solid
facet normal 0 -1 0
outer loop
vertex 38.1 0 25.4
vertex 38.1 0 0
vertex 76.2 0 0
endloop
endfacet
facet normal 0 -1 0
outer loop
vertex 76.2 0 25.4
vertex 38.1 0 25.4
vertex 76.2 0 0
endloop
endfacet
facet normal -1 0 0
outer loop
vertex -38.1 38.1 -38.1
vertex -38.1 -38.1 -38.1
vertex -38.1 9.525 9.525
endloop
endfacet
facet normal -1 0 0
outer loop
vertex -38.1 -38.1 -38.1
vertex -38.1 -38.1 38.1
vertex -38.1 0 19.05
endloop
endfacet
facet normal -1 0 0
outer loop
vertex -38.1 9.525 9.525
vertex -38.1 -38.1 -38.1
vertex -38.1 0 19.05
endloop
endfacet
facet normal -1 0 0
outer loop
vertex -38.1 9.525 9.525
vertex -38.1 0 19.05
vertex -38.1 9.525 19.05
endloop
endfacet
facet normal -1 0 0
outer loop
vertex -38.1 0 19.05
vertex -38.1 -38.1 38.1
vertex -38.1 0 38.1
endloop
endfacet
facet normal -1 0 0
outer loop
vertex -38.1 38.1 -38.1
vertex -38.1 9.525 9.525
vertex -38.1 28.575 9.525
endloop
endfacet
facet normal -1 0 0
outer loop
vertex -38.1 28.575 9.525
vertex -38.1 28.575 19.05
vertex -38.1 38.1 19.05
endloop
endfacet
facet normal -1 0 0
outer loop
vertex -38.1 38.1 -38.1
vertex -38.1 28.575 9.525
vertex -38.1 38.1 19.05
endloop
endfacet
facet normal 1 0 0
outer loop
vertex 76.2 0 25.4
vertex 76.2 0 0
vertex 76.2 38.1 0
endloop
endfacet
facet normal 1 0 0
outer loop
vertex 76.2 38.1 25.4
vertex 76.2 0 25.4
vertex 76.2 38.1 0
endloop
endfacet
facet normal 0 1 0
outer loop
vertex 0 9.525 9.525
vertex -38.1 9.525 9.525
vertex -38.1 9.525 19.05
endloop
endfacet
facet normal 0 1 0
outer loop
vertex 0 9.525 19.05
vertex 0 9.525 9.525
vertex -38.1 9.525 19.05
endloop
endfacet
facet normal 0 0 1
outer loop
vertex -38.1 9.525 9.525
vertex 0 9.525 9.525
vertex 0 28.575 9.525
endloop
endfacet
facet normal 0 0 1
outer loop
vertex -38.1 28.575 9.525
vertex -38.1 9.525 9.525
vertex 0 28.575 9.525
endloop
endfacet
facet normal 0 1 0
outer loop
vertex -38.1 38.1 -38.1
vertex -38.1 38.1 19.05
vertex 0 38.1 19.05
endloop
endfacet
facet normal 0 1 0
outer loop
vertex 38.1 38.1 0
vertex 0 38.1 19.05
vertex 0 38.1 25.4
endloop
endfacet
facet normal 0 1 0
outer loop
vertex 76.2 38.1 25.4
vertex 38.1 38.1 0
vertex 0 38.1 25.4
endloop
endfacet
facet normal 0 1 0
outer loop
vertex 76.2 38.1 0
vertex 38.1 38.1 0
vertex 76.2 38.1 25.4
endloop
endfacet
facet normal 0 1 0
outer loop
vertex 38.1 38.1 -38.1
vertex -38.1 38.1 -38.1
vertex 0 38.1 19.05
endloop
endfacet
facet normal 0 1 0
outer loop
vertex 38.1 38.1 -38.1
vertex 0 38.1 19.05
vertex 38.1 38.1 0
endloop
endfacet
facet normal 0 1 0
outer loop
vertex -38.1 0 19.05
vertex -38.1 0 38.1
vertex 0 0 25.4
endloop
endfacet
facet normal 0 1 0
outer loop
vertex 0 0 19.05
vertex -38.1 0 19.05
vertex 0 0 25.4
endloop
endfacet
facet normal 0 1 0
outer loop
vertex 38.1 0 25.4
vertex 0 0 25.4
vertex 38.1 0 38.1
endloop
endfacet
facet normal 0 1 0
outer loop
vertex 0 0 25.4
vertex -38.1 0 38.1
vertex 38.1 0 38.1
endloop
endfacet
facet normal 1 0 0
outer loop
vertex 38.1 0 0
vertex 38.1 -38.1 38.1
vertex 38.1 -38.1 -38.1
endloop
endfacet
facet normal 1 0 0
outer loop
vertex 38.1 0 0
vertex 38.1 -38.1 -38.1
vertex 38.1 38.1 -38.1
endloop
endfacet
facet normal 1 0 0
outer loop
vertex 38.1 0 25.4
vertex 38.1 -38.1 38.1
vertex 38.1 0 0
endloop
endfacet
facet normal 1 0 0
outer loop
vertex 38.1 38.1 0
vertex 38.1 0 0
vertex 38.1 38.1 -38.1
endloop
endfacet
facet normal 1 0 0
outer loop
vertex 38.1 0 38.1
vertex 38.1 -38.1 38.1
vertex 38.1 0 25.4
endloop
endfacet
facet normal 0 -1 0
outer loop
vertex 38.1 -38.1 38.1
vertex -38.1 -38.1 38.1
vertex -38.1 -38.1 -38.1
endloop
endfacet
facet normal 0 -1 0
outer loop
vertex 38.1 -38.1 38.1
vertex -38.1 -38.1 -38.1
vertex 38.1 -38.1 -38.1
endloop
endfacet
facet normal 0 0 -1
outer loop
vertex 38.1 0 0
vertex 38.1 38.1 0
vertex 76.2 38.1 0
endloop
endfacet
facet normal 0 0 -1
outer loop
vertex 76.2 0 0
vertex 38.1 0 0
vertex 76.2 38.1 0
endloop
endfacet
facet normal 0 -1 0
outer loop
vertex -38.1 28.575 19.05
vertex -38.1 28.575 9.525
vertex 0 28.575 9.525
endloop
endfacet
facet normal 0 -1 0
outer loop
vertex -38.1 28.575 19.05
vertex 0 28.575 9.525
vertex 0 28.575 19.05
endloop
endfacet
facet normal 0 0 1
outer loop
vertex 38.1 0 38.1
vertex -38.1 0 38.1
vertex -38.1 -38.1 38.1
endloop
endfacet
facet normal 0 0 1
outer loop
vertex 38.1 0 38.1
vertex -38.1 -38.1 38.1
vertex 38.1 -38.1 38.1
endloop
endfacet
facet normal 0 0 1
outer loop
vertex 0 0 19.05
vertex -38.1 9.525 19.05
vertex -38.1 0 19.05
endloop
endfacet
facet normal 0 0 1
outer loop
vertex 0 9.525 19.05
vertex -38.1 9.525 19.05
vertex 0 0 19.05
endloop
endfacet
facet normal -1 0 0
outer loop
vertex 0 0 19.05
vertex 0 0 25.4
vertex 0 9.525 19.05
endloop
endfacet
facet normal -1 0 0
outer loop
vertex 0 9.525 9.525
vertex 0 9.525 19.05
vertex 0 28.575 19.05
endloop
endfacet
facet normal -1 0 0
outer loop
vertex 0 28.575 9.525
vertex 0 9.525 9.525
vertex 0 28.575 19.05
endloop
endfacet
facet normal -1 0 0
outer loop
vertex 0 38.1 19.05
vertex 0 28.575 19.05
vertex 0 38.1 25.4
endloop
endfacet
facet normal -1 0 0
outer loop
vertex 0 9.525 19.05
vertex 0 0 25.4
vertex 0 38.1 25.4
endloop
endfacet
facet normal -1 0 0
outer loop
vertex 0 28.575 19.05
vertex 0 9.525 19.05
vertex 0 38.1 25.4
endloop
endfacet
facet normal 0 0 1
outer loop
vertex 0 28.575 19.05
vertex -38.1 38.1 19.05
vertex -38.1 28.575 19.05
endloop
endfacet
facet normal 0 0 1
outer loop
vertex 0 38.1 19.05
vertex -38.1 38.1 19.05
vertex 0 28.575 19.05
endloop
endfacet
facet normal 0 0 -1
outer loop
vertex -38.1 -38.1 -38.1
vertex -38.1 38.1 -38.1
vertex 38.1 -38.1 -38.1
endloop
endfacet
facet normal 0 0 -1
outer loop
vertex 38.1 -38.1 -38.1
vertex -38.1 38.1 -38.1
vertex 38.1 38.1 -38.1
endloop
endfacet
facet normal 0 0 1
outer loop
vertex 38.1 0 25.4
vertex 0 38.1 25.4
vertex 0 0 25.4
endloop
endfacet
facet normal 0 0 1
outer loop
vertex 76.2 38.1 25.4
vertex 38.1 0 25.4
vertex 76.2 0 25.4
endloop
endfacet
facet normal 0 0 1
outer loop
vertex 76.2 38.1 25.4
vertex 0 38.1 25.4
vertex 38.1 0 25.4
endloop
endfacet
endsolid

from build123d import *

# Parameters (mm, degrees)
F0_W     = 76.2
F0_H     = 76.2
F1_DEPTH = 38.1
F2_W     = 19.05
F2_H     = 19.05
F3_DEPTH = 38.1
F4_W     = 76.2
F4_H     = 38.1
F5_DEPTH = 19.05
F6_W     = 76.2
F6_H     = 38.1
F7_DEPTH = 25.4


with BuildPart() as f1:
    # F0 (on Top) → F1 (new body, symmetric)
    with BuildSketch(Plane.XY):
        Rectangle(F0_W, F0_H)
    extrude(amount=F1_DEPTH, both=True)

    # F2 (on Right) → F3 (cut)
    with BuildSketch(Plane.YZ):
        with Locations((19.05, 19.05)):
            Rectangle(F2_W, F2_H)
    extrude(amount=-F3_DEPTH, mode=Mode.SUBTRACT)

    # F4 (on face) → F5 (cut)
    with BuildSketch(Plane.XY.offset(38.1)):
        with Locations((0, 19.05)):
            Rectangle(F4_W, F4_H)
    extrude(amount=-F5_DEPTH, mode=Mode.SUBTRACT)

    # F6 (on Top) → F7 (join)
    with BuildSketch(Plane.XY):
        with Locations((38.1, 19.05)):
            Rectangle(F6_W, F6_H)
    extrude(amount=F7_DEPTH)


solid = f1.part
